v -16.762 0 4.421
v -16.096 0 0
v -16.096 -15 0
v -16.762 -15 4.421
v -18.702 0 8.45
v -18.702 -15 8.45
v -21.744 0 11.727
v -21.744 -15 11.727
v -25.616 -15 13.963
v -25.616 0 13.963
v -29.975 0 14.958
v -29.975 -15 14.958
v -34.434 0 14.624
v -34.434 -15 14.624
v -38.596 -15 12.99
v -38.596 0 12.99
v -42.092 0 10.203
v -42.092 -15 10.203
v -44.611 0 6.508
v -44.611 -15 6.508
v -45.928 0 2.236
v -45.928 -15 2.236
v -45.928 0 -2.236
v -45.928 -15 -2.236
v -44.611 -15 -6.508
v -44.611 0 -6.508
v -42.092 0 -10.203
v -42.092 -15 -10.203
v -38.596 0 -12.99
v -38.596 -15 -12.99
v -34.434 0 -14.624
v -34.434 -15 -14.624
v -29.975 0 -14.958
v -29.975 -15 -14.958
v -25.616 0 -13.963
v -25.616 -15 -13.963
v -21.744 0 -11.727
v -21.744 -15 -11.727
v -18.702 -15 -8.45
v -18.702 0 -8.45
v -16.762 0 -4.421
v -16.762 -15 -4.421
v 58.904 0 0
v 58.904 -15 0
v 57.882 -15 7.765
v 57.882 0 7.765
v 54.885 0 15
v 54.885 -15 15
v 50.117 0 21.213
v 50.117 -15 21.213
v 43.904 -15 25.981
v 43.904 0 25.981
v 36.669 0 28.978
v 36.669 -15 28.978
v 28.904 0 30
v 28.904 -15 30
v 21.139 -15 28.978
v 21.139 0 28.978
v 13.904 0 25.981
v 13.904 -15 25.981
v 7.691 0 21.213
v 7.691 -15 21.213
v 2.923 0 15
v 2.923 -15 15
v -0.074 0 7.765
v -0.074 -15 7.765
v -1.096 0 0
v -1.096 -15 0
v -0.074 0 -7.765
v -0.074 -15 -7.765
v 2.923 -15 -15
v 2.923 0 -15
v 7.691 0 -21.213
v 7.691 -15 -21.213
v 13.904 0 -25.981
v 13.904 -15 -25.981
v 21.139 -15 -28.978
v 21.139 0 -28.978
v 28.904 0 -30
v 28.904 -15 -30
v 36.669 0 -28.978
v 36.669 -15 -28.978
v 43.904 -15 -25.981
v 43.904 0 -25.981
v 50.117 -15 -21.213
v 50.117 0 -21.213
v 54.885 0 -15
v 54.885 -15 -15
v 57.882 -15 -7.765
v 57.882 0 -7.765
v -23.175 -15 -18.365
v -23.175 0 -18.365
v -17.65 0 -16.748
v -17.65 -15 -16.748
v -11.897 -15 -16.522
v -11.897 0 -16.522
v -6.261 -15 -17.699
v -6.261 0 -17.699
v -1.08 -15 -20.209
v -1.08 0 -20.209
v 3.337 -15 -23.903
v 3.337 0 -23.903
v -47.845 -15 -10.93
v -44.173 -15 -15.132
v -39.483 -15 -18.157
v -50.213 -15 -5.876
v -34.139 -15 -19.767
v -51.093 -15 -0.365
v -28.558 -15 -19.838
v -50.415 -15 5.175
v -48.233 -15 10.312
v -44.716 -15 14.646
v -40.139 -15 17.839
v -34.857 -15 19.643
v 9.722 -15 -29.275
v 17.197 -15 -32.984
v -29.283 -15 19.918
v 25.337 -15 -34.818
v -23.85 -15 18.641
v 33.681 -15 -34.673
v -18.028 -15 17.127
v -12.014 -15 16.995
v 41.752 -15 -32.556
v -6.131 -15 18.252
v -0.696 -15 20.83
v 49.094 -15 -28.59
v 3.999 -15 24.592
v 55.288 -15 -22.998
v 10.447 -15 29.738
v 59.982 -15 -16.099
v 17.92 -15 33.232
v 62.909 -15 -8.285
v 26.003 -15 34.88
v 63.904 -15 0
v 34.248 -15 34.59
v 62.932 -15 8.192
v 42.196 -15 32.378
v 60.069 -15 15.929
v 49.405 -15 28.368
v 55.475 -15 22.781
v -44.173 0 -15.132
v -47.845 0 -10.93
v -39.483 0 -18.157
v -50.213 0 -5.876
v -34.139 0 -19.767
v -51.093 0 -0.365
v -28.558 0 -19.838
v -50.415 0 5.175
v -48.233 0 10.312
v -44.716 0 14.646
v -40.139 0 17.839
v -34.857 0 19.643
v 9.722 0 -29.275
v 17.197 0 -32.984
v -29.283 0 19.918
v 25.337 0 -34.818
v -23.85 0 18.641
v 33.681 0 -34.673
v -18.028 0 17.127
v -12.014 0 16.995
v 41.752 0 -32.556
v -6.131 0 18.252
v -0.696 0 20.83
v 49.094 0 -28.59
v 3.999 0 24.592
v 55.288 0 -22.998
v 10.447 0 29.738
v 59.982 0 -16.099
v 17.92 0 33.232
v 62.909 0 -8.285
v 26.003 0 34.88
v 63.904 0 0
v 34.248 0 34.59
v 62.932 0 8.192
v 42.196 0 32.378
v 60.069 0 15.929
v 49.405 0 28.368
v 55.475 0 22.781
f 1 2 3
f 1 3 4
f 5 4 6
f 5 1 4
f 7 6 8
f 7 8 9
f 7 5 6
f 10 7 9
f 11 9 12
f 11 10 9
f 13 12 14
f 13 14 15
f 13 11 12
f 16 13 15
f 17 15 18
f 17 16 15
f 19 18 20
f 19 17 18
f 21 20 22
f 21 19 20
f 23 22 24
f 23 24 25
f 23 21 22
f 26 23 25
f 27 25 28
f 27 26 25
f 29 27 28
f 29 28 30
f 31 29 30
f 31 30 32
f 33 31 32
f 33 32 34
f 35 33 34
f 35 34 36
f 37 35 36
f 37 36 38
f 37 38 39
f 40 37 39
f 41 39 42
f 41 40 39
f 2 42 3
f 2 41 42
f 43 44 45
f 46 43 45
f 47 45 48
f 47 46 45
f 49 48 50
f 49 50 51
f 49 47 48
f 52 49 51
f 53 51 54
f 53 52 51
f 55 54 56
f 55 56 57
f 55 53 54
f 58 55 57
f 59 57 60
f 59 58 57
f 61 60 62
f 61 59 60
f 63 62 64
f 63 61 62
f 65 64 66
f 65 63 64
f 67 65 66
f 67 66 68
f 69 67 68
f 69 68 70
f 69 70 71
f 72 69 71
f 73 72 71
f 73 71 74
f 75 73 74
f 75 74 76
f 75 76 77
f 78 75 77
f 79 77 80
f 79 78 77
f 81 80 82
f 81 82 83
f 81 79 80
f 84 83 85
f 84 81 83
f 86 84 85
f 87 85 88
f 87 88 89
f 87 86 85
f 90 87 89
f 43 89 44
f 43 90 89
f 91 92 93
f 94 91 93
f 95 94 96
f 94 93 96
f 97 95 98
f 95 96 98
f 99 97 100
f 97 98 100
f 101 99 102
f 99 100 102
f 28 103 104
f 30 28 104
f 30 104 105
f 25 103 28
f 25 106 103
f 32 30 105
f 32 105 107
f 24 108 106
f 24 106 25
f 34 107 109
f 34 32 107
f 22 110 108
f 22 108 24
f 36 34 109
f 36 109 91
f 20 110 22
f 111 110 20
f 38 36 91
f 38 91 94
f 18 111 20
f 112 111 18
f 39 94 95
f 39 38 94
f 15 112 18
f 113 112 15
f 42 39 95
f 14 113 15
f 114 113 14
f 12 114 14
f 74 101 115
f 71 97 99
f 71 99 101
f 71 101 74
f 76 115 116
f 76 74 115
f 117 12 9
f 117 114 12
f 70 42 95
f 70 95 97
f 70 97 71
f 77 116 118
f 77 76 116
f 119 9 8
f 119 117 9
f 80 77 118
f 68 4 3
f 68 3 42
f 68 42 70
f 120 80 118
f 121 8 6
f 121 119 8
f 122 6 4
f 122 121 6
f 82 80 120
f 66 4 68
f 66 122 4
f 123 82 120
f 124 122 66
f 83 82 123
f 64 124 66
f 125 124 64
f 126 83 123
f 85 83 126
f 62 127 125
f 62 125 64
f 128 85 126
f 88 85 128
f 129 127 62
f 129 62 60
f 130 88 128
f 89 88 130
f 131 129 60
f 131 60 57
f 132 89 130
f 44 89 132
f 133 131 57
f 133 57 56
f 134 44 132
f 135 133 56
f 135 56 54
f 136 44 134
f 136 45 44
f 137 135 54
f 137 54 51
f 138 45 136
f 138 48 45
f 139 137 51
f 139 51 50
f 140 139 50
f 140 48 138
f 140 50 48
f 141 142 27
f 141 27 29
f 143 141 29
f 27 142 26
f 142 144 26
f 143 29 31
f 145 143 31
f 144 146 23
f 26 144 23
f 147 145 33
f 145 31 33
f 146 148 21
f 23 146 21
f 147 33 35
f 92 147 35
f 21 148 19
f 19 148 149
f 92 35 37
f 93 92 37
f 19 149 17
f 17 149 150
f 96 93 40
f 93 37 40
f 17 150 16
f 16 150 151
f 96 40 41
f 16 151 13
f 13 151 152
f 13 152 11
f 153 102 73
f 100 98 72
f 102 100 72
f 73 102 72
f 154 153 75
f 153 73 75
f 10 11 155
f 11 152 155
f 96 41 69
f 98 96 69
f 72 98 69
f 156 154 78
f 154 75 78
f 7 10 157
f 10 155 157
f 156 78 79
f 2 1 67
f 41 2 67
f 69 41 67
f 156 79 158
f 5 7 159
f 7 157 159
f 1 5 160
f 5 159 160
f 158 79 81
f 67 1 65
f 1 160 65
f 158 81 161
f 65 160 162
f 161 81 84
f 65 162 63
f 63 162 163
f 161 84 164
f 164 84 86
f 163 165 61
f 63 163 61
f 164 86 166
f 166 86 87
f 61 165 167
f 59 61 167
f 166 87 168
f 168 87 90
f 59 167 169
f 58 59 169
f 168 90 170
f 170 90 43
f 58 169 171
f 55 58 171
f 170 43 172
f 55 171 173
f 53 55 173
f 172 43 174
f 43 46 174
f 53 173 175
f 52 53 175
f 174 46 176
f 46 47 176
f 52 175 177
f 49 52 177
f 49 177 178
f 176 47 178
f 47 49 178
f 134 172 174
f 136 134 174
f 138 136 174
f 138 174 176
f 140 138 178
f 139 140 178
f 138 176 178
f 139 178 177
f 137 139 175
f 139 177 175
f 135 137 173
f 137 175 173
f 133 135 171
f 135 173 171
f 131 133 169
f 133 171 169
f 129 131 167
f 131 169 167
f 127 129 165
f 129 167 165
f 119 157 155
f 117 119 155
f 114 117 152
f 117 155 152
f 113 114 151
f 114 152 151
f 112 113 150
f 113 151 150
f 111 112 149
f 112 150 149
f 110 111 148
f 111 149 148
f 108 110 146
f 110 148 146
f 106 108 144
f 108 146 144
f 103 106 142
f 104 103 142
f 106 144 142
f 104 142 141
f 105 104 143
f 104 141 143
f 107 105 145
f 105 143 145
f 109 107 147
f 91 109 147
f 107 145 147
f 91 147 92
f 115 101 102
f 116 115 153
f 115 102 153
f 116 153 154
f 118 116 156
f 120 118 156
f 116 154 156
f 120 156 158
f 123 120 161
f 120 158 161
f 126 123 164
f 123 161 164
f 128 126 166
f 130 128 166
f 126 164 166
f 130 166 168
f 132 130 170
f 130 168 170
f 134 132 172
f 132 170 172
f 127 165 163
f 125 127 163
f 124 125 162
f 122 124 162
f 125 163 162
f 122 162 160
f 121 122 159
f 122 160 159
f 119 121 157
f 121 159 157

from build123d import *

# Parameters (mm, degrees)
F0_R     = 15
F0_R_2   = 30
F1_DEPTH = 15


with BuildPart() as f1:
    # F0 (on Front) → F1 (new body)
    with BuildSketch(Plane.XZ):
        with BuildLine():
            ThreePointArc((-23.175316, -18.364728), (-14.386495, -10.990608), (-11.09597, 0))
            ThreePointArc((-11.09597, 0), (-14.589644, 11.293415), (-23.850092, 18.641278))
            ThreePointArc((-23.850092, 18.641278), (-51.092646, -0.364624), (-23.175316, -18.364728))
        make_face()
        with Locations((-31.09597, 0)):
            Circle(F0_R, mode=Mode.SUBTRACT)
        with BuildLine():
            ThreePointArc((-23.850092, 18.641278), (-14.589644, 11.293415), (-11.09597, 0))
            ThreePointArc((-11.09597, 0), (-14.386495, -10.990608), (-23.175316, -18.364728))
            ThreePointArc((-23.175316, -18.364728), (-9.042619, -16.937632), (3.337154, -23.902611))
            ThreePointArc((3.337154, -23.902611), (-6.092708, 0.477784), (3.99921, 24.591664))
            ThreePointArc((3.99921, 24.591664), (-9.035618, 17.451877), (-23.850092, 18.641278))
        make_face()
        with BuildLine():
            ThreePointArc((63.90403, 0), (42.195593, 32.377992), (3.99921, 24.591664))
            ThreePointArc((3.99921, 24.591664), (-6.092708, 0.477784), (3.337154, -23.902611))
            ThreePointArc((3.337154, -23.902611), (41.752363, -32.556418), (63.90403, 0))
        make_face()
        with Locations((28.90403, 0)):
            Circle(F0_R_2, mode=Mode.SUBTRACT)
    extrude(amount=F1_DEPTH)


solid = f1.part
